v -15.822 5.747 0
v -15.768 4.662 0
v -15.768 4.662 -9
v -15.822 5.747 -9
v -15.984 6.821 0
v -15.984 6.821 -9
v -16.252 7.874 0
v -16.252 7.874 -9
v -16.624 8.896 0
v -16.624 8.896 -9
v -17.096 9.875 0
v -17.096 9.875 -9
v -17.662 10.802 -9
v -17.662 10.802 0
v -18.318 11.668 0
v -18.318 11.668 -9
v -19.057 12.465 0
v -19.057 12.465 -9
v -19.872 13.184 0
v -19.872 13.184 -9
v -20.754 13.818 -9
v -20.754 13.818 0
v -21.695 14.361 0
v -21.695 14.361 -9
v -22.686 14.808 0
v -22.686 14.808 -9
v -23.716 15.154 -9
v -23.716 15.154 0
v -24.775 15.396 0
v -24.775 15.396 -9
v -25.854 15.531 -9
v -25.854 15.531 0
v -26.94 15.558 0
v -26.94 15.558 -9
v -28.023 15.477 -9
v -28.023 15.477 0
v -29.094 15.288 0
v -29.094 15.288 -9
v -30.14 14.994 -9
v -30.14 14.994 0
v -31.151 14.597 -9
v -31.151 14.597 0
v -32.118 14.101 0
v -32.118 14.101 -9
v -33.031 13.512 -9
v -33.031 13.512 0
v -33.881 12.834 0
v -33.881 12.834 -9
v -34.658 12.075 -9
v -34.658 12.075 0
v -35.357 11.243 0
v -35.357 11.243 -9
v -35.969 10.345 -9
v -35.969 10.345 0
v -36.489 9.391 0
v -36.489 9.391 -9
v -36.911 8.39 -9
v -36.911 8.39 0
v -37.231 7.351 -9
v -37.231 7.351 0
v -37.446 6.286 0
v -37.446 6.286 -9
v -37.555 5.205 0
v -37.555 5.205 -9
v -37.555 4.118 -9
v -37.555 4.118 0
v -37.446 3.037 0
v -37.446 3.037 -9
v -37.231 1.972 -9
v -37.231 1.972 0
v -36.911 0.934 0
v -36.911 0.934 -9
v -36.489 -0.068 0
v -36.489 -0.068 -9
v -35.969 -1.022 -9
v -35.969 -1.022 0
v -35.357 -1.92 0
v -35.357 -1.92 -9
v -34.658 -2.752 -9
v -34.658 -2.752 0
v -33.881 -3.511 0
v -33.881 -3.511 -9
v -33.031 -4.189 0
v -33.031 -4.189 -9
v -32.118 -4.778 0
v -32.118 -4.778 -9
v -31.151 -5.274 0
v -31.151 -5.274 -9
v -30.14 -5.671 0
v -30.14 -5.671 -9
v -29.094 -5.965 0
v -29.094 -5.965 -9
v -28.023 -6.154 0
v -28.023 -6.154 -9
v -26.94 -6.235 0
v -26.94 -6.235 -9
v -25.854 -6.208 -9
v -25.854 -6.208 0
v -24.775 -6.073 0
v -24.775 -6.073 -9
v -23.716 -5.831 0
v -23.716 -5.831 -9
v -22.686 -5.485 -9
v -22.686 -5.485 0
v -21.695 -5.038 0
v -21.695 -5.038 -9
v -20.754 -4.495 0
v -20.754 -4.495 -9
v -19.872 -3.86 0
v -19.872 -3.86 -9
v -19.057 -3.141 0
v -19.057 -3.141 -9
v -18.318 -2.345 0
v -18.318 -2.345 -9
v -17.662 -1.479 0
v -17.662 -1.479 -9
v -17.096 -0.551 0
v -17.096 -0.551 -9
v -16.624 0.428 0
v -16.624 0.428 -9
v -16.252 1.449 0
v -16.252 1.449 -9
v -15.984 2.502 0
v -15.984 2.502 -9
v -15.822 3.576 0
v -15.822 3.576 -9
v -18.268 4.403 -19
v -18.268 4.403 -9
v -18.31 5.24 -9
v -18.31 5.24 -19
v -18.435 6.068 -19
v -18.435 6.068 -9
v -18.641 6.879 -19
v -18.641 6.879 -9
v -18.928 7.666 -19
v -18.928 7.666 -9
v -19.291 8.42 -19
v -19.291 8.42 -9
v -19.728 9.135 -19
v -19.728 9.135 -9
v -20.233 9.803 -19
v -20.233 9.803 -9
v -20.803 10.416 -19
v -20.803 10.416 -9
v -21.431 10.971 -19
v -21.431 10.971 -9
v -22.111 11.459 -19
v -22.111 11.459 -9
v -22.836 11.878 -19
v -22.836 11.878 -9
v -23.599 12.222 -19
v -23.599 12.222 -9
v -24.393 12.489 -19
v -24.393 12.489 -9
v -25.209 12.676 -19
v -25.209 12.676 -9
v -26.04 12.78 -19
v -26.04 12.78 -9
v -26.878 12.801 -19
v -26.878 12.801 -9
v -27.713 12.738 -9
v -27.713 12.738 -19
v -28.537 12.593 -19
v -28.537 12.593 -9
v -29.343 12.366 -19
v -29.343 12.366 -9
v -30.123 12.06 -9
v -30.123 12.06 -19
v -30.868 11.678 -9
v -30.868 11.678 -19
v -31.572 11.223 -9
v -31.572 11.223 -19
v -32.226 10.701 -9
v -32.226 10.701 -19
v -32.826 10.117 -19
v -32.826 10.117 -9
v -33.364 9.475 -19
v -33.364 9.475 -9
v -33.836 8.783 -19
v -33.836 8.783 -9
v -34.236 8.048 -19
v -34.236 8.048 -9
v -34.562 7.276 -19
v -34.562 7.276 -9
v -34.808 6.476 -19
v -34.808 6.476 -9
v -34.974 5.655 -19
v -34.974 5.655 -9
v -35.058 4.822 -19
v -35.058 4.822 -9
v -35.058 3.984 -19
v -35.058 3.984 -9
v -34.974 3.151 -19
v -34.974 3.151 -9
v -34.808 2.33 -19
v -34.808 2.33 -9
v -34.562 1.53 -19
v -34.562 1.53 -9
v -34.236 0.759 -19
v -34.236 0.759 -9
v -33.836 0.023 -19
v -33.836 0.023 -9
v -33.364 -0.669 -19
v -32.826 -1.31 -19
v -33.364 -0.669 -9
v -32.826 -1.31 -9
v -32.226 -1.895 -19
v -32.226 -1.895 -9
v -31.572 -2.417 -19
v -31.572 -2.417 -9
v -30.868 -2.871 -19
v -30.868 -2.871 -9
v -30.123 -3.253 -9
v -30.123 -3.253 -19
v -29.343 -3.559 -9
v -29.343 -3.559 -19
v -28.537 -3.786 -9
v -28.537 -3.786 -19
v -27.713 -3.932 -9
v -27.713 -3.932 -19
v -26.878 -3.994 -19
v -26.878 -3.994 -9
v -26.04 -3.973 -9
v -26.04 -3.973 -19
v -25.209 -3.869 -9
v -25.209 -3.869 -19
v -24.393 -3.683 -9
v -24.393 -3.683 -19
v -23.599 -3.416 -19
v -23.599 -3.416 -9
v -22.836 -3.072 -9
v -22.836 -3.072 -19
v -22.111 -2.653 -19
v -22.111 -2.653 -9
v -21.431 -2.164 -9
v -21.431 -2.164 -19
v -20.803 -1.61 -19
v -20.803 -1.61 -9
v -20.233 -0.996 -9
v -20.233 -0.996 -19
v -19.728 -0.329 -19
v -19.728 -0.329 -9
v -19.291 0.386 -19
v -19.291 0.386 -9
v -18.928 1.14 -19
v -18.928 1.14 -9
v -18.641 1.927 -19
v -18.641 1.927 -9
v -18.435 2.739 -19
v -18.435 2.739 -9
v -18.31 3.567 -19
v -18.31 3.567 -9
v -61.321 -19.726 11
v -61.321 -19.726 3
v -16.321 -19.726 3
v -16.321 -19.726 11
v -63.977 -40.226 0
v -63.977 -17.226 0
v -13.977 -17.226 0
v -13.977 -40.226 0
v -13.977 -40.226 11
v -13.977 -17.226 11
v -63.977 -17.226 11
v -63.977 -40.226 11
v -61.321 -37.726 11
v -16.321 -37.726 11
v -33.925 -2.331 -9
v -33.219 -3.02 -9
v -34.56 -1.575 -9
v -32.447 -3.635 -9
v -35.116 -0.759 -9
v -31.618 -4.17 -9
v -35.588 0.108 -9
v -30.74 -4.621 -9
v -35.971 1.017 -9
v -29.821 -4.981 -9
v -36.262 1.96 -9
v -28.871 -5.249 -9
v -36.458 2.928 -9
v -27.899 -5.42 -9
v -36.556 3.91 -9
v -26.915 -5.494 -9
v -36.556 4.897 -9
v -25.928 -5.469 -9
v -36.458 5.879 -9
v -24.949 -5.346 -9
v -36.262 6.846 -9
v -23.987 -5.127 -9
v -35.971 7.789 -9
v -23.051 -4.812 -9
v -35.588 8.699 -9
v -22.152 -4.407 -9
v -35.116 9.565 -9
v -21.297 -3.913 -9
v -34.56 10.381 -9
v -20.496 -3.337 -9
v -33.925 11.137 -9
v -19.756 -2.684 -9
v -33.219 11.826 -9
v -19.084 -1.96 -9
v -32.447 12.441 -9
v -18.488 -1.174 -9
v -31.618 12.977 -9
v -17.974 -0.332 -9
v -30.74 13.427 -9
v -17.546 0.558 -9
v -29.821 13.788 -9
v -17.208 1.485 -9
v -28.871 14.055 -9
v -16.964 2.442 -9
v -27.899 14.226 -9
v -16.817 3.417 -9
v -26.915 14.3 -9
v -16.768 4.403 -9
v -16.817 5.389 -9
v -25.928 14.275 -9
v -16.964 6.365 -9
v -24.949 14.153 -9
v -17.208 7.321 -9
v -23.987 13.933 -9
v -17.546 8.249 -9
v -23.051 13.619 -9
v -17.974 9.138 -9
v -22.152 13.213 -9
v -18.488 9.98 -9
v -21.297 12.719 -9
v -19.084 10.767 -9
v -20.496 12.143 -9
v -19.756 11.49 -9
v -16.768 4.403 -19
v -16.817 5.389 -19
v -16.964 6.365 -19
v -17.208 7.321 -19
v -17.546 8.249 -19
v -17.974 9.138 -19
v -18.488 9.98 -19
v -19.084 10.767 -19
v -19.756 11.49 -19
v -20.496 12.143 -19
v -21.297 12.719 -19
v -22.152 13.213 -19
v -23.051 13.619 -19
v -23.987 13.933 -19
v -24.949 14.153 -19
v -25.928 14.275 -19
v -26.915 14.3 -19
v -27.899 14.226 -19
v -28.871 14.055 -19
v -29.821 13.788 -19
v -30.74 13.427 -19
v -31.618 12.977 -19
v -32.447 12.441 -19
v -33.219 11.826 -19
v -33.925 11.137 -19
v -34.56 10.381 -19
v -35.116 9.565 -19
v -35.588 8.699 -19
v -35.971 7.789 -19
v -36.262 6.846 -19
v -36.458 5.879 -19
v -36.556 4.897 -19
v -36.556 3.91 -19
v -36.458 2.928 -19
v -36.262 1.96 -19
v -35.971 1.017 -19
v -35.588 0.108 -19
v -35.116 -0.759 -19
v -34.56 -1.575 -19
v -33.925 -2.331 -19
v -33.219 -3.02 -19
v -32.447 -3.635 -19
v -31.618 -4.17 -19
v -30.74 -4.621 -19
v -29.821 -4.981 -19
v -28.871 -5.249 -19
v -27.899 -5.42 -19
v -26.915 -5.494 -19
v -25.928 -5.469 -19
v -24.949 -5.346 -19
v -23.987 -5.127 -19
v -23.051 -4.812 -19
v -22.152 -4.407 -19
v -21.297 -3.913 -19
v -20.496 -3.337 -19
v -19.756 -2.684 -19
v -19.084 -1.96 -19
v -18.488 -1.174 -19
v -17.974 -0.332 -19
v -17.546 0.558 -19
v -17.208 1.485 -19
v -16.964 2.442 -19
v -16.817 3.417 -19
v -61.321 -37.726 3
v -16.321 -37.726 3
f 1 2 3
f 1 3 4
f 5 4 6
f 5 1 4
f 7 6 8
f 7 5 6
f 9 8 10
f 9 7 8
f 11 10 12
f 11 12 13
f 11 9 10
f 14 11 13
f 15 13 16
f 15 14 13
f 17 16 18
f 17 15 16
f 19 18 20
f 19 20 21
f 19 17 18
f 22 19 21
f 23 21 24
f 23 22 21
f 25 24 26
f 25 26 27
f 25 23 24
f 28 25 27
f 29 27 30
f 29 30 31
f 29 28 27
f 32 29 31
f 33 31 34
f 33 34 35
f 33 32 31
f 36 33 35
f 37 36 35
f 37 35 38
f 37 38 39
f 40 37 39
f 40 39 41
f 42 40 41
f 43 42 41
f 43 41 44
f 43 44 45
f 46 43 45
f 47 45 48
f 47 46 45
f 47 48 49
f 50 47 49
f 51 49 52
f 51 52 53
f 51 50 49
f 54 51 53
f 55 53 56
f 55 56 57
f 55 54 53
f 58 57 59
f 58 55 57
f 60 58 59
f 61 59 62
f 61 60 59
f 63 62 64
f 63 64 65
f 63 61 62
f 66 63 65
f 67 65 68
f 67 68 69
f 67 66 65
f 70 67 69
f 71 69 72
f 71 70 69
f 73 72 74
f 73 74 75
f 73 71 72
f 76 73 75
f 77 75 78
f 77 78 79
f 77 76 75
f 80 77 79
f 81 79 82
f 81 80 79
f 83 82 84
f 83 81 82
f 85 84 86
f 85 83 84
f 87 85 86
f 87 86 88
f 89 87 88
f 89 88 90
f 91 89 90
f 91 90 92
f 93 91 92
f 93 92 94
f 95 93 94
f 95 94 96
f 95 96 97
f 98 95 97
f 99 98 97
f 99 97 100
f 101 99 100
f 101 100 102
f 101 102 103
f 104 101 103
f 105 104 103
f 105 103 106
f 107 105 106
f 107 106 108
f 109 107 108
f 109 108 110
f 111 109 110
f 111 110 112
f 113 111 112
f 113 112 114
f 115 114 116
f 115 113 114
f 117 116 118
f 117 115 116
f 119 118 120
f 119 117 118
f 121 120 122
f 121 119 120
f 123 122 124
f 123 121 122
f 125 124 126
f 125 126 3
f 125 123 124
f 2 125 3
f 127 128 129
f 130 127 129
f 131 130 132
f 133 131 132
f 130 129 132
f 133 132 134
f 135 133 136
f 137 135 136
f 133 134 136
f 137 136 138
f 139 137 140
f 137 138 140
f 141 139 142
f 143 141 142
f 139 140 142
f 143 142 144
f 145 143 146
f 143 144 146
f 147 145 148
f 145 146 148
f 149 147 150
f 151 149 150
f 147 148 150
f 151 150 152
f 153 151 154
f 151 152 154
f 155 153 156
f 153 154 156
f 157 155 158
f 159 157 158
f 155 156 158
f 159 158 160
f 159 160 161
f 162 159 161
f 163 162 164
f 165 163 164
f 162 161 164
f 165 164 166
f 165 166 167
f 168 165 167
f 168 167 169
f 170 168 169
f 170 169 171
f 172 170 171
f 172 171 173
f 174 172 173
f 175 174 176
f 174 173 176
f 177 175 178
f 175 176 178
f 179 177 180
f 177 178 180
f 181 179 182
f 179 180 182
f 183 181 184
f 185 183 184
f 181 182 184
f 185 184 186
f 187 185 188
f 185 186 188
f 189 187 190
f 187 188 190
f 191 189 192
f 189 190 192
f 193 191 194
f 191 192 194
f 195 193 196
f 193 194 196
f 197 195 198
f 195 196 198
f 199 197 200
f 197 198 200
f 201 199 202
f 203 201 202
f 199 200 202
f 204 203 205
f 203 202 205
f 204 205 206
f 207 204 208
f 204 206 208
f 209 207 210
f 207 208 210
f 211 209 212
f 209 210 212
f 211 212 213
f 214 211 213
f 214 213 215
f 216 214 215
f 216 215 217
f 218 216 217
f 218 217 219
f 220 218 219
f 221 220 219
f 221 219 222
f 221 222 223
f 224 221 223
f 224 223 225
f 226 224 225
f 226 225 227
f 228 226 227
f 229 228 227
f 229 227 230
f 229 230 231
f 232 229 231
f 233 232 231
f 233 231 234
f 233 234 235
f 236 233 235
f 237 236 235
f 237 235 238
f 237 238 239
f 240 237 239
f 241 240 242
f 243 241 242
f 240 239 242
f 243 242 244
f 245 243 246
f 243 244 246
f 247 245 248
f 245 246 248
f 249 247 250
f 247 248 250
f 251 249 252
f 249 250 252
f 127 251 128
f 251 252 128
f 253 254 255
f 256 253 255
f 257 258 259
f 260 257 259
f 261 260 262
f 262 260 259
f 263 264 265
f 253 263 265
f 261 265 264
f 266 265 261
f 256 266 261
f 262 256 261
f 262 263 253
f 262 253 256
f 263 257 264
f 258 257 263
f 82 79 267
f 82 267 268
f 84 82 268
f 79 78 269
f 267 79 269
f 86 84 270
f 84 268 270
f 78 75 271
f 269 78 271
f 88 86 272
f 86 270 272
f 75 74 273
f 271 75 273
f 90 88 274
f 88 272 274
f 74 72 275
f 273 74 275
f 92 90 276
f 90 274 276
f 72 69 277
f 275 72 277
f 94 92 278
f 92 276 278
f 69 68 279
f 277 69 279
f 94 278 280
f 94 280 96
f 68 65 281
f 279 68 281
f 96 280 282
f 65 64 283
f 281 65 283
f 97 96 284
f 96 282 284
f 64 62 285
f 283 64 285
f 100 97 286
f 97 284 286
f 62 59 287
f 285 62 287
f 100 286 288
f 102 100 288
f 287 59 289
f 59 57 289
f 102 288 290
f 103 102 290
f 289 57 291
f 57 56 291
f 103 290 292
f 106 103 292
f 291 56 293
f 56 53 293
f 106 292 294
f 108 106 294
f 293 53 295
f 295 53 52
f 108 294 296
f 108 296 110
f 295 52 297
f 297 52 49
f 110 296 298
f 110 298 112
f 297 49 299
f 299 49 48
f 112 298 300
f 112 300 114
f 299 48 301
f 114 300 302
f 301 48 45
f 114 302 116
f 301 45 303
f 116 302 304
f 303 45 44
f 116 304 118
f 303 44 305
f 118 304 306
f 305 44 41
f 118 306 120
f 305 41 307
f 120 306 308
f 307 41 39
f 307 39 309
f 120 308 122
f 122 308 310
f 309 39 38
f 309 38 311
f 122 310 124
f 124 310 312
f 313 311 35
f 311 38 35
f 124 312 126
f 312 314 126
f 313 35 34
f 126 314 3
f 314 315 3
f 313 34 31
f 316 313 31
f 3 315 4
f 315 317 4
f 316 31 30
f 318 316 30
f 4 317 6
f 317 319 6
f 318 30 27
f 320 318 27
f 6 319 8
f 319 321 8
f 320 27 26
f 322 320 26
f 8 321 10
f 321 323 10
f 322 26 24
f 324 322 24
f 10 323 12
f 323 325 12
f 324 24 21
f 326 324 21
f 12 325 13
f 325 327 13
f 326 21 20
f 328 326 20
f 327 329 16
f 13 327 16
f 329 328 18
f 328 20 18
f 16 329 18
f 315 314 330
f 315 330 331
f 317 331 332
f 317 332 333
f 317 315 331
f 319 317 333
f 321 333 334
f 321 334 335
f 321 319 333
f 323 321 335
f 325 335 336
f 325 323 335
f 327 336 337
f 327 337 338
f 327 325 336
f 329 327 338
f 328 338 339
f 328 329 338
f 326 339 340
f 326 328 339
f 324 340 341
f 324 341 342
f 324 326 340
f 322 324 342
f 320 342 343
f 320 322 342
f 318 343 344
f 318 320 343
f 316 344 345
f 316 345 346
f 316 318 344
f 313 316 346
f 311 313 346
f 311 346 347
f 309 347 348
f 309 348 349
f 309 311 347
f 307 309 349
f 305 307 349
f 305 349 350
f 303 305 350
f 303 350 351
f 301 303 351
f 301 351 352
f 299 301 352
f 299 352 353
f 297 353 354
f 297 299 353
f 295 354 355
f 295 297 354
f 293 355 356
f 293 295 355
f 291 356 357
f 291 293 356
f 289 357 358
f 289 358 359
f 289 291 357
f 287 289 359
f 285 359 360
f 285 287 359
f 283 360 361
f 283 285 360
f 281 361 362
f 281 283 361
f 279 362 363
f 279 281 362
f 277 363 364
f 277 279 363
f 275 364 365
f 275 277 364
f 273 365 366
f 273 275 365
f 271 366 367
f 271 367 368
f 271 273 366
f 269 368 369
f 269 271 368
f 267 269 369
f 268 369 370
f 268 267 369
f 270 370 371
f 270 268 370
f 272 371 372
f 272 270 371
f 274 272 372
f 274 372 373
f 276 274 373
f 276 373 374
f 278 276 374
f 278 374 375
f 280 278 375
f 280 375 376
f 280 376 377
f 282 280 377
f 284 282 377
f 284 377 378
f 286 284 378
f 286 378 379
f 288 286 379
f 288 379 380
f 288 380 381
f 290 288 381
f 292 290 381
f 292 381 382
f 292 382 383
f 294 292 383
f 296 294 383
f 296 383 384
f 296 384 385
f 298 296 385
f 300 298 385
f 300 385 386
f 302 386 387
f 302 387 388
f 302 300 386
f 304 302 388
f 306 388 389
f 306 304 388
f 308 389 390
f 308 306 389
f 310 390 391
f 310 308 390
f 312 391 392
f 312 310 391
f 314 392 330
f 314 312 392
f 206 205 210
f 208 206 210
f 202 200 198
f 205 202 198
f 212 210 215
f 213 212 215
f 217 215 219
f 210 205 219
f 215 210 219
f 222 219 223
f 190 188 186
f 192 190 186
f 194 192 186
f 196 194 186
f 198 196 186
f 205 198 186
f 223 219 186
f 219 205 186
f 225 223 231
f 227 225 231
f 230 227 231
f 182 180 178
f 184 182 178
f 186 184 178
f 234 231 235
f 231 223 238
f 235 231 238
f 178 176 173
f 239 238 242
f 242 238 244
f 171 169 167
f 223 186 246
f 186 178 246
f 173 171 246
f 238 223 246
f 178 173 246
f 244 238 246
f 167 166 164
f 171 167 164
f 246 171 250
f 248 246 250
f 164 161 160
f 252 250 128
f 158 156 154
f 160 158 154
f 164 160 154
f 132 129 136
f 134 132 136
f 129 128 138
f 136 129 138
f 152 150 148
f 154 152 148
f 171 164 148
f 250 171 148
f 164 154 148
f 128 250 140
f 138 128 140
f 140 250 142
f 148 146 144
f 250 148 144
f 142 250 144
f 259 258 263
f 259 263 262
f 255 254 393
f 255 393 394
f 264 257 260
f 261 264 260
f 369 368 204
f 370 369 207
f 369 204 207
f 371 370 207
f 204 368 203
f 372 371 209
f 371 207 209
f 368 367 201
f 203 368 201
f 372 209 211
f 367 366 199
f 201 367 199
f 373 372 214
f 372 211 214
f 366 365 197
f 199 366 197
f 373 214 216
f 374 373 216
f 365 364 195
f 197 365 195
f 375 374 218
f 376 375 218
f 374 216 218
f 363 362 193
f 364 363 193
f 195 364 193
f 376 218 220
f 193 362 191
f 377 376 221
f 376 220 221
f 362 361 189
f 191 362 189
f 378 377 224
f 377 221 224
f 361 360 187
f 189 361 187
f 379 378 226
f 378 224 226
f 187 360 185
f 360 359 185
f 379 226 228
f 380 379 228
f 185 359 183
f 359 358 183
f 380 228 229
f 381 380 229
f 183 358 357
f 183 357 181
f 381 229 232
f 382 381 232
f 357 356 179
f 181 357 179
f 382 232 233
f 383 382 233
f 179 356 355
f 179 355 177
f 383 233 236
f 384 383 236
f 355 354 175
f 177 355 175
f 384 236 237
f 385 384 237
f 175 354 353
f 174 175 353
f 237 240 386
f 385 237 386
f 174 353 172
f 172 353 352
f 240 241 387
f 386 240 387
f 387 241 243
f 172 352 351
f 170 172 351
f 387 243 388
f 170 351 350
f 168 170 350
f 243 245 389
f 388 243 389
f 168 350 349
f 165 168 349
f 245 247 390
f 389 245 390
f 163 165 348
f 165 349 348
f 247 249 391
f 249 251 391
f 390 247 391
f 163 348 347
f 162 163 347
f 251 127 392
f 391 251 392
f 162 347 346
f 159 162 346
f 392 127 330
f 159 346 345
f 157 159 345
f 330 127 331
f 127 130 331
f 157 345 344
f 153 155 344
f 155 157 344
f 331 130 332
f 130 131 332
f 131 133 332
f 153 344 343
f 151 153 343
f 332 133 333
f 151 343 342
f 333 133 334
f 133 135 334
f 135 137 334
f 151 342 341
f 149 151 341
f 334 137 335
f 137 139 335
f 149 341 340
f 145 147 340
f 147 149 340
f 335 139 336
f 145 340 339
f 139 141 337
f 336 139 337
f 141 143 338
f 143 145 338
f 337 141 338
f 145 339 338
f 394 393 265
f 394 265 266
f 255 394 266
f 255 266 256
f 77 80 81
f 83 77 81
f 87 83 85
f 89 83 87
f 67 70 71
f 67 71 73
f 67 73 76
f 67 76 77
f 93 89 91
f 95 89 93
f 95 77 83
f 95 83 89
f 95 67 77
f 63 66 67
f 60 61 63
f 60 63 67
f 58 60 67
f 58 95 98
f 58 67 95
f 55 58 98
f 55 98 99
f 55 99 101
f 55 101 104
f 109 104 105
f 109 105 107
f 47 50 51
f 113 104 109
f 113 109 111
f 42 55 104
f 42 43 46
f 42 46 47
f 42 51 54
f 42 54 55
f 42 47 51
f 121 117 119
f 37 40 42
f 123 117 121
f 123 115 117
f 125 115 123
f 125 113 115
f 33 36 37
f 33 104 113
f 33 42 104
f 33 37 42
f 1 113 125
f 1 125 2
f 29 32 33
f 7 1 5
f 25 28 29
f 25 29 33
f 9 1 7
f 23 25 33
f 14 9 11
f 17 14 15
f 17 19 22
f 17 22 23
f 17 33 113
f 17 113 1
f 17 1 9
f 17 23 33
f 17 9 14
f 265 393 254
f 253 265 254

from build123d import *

# Parameters (mm, degrees)
F0_R      = 10.9
F2_R      = 1
F4_DEPTH  = 9
F6_R      = 9.9
F6_R_2    = 8.4
F7_DEPTH  = 10
F0_W      = 50
F0_H      = 23
F0_W_2    = 45
F0_H_2    = 18
F9_DEPTH  = 11
F10_DEPTH = 3


with BuildPart() as f3:
    # F0 (on Top) → F3 section 0
    with BuildSketch(Plane.XY):
        with Locations((-26.668137, 4.661598)):
            Circle(F0_R)
    # F2 (on offset) → F3 section 1
    with BuildSketch(Plane.XY.offset(-2)):
        with Locations((-26.668137, 4.342747)):
            Circle(F2_R)
    loft()

    # F0 (on Top) → F4 (join)
    with BuildSketch(Plane.XY):
        with Locations((-26.668137, 4.661598)):
            Circle(F0_R)
    extrude(amount=-F4_DEPTH)

    # F6 (on offset) → F7 (join)
    with BuildSketch(Plane.XY.offset(-9)):
        with Locations((-26.668137, 4.403152)):
            Circle(F6_R)
        with Locations((-26.668137, 4.403152)):
            Circle(F6_R_2, mode=Mode.SUBTRACT)
    extrude(amount=-F7_DEPTH)


with BuildPart() as f9:
    # F0 (on Top) → F9 (new body)
    with BuildSketch(Plane.XY):
        with Locations((-38.977189, -28.72632)):
            Rectangle(F0_W, F0_H)
        with Locations((-38.820968, -28.72632)):
            Rectangle(F0_W_2, F0_H_2, mode=Mode.SUBTRACT)
    extrude(amount=F9_DEPTH)

    # F0 (on Top) → F10 (join)
    with BuildSketch(Plane.XY):
        with Locations((-38.820968, -28.72632)):
            Rectangle(F0_W_2, F0_H_2)
    extrude(amount=F10_DEPTH)


solid = Compound([f3.part, f9.part])
